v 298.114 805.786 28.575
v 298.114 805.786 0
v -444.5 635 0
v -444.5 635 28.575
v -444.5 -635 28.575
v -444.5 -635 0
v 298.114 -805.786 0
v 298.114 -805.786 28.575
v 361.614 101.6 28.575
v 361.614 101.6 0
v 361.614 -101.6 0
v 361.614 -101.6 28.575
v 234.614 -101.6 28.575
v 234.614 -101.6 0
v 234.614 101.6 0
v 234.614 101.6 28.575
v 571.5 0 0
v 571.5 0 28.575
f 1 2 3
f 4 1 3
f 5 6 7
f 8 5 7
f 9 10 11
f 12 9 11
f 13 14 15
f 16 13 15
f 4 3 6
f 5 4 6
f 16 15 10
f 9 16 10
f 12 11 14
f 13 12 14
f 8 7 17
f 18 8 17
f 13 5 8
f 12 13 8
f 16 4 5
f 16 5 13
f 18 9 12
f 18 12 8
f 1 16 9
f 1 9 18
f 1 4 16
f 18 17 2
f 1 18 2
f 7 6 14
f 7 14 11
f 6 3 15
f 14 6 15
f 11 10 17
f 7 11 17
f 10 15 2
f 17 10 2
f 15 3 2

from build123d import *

# Parameters (mm, degrees)
F0_W     = 127
F0_H     = 101.6
F1_DEPTH = 28.575


with BuildPart() as f1:
    # F0 (on Top) → F1 (new body)
    with BuildSketch(Plane.XY):
        Polygon((298.114391, -805.786025), (571.5, 0), (361.614391, 0), (361.614391, -101.6), (298.114391, -101.6), align=None)
        Polygon((298.114391, 101.6), (298.114391, 805.786025), (-444.5, 635), (-444.5, 0), (-63.5, 0), (-63.5, 101.6), (63.5, 101.6), (63.5, 0), (234.614391, 0), (234.614391, 101.6), align=None)
        Polygon((361.614391, 0), (571.5, 0), (298.114391, 805.786025), (298.114391, 101.6), (361.614391, 101.6), align=None)
        Polygon((-444.5, -635), (298.114391, -805.786025), (298.114391, -101.6), (234.614391, -101.6), (234.614391, 0), (63.5, 0), (63.5, -101.6), (-63.5, -101.6), (-63.5, 0), (-444.5, 0), align=None)
        with Locations((0, 50.8)):
            Rectangle(F0_W, F0_H)
        with Locations((0, -50.8)):
            Rectangle(F0_W, F0_H)
    extrude(amount=F1_DEPTH)


solid = f1.part
